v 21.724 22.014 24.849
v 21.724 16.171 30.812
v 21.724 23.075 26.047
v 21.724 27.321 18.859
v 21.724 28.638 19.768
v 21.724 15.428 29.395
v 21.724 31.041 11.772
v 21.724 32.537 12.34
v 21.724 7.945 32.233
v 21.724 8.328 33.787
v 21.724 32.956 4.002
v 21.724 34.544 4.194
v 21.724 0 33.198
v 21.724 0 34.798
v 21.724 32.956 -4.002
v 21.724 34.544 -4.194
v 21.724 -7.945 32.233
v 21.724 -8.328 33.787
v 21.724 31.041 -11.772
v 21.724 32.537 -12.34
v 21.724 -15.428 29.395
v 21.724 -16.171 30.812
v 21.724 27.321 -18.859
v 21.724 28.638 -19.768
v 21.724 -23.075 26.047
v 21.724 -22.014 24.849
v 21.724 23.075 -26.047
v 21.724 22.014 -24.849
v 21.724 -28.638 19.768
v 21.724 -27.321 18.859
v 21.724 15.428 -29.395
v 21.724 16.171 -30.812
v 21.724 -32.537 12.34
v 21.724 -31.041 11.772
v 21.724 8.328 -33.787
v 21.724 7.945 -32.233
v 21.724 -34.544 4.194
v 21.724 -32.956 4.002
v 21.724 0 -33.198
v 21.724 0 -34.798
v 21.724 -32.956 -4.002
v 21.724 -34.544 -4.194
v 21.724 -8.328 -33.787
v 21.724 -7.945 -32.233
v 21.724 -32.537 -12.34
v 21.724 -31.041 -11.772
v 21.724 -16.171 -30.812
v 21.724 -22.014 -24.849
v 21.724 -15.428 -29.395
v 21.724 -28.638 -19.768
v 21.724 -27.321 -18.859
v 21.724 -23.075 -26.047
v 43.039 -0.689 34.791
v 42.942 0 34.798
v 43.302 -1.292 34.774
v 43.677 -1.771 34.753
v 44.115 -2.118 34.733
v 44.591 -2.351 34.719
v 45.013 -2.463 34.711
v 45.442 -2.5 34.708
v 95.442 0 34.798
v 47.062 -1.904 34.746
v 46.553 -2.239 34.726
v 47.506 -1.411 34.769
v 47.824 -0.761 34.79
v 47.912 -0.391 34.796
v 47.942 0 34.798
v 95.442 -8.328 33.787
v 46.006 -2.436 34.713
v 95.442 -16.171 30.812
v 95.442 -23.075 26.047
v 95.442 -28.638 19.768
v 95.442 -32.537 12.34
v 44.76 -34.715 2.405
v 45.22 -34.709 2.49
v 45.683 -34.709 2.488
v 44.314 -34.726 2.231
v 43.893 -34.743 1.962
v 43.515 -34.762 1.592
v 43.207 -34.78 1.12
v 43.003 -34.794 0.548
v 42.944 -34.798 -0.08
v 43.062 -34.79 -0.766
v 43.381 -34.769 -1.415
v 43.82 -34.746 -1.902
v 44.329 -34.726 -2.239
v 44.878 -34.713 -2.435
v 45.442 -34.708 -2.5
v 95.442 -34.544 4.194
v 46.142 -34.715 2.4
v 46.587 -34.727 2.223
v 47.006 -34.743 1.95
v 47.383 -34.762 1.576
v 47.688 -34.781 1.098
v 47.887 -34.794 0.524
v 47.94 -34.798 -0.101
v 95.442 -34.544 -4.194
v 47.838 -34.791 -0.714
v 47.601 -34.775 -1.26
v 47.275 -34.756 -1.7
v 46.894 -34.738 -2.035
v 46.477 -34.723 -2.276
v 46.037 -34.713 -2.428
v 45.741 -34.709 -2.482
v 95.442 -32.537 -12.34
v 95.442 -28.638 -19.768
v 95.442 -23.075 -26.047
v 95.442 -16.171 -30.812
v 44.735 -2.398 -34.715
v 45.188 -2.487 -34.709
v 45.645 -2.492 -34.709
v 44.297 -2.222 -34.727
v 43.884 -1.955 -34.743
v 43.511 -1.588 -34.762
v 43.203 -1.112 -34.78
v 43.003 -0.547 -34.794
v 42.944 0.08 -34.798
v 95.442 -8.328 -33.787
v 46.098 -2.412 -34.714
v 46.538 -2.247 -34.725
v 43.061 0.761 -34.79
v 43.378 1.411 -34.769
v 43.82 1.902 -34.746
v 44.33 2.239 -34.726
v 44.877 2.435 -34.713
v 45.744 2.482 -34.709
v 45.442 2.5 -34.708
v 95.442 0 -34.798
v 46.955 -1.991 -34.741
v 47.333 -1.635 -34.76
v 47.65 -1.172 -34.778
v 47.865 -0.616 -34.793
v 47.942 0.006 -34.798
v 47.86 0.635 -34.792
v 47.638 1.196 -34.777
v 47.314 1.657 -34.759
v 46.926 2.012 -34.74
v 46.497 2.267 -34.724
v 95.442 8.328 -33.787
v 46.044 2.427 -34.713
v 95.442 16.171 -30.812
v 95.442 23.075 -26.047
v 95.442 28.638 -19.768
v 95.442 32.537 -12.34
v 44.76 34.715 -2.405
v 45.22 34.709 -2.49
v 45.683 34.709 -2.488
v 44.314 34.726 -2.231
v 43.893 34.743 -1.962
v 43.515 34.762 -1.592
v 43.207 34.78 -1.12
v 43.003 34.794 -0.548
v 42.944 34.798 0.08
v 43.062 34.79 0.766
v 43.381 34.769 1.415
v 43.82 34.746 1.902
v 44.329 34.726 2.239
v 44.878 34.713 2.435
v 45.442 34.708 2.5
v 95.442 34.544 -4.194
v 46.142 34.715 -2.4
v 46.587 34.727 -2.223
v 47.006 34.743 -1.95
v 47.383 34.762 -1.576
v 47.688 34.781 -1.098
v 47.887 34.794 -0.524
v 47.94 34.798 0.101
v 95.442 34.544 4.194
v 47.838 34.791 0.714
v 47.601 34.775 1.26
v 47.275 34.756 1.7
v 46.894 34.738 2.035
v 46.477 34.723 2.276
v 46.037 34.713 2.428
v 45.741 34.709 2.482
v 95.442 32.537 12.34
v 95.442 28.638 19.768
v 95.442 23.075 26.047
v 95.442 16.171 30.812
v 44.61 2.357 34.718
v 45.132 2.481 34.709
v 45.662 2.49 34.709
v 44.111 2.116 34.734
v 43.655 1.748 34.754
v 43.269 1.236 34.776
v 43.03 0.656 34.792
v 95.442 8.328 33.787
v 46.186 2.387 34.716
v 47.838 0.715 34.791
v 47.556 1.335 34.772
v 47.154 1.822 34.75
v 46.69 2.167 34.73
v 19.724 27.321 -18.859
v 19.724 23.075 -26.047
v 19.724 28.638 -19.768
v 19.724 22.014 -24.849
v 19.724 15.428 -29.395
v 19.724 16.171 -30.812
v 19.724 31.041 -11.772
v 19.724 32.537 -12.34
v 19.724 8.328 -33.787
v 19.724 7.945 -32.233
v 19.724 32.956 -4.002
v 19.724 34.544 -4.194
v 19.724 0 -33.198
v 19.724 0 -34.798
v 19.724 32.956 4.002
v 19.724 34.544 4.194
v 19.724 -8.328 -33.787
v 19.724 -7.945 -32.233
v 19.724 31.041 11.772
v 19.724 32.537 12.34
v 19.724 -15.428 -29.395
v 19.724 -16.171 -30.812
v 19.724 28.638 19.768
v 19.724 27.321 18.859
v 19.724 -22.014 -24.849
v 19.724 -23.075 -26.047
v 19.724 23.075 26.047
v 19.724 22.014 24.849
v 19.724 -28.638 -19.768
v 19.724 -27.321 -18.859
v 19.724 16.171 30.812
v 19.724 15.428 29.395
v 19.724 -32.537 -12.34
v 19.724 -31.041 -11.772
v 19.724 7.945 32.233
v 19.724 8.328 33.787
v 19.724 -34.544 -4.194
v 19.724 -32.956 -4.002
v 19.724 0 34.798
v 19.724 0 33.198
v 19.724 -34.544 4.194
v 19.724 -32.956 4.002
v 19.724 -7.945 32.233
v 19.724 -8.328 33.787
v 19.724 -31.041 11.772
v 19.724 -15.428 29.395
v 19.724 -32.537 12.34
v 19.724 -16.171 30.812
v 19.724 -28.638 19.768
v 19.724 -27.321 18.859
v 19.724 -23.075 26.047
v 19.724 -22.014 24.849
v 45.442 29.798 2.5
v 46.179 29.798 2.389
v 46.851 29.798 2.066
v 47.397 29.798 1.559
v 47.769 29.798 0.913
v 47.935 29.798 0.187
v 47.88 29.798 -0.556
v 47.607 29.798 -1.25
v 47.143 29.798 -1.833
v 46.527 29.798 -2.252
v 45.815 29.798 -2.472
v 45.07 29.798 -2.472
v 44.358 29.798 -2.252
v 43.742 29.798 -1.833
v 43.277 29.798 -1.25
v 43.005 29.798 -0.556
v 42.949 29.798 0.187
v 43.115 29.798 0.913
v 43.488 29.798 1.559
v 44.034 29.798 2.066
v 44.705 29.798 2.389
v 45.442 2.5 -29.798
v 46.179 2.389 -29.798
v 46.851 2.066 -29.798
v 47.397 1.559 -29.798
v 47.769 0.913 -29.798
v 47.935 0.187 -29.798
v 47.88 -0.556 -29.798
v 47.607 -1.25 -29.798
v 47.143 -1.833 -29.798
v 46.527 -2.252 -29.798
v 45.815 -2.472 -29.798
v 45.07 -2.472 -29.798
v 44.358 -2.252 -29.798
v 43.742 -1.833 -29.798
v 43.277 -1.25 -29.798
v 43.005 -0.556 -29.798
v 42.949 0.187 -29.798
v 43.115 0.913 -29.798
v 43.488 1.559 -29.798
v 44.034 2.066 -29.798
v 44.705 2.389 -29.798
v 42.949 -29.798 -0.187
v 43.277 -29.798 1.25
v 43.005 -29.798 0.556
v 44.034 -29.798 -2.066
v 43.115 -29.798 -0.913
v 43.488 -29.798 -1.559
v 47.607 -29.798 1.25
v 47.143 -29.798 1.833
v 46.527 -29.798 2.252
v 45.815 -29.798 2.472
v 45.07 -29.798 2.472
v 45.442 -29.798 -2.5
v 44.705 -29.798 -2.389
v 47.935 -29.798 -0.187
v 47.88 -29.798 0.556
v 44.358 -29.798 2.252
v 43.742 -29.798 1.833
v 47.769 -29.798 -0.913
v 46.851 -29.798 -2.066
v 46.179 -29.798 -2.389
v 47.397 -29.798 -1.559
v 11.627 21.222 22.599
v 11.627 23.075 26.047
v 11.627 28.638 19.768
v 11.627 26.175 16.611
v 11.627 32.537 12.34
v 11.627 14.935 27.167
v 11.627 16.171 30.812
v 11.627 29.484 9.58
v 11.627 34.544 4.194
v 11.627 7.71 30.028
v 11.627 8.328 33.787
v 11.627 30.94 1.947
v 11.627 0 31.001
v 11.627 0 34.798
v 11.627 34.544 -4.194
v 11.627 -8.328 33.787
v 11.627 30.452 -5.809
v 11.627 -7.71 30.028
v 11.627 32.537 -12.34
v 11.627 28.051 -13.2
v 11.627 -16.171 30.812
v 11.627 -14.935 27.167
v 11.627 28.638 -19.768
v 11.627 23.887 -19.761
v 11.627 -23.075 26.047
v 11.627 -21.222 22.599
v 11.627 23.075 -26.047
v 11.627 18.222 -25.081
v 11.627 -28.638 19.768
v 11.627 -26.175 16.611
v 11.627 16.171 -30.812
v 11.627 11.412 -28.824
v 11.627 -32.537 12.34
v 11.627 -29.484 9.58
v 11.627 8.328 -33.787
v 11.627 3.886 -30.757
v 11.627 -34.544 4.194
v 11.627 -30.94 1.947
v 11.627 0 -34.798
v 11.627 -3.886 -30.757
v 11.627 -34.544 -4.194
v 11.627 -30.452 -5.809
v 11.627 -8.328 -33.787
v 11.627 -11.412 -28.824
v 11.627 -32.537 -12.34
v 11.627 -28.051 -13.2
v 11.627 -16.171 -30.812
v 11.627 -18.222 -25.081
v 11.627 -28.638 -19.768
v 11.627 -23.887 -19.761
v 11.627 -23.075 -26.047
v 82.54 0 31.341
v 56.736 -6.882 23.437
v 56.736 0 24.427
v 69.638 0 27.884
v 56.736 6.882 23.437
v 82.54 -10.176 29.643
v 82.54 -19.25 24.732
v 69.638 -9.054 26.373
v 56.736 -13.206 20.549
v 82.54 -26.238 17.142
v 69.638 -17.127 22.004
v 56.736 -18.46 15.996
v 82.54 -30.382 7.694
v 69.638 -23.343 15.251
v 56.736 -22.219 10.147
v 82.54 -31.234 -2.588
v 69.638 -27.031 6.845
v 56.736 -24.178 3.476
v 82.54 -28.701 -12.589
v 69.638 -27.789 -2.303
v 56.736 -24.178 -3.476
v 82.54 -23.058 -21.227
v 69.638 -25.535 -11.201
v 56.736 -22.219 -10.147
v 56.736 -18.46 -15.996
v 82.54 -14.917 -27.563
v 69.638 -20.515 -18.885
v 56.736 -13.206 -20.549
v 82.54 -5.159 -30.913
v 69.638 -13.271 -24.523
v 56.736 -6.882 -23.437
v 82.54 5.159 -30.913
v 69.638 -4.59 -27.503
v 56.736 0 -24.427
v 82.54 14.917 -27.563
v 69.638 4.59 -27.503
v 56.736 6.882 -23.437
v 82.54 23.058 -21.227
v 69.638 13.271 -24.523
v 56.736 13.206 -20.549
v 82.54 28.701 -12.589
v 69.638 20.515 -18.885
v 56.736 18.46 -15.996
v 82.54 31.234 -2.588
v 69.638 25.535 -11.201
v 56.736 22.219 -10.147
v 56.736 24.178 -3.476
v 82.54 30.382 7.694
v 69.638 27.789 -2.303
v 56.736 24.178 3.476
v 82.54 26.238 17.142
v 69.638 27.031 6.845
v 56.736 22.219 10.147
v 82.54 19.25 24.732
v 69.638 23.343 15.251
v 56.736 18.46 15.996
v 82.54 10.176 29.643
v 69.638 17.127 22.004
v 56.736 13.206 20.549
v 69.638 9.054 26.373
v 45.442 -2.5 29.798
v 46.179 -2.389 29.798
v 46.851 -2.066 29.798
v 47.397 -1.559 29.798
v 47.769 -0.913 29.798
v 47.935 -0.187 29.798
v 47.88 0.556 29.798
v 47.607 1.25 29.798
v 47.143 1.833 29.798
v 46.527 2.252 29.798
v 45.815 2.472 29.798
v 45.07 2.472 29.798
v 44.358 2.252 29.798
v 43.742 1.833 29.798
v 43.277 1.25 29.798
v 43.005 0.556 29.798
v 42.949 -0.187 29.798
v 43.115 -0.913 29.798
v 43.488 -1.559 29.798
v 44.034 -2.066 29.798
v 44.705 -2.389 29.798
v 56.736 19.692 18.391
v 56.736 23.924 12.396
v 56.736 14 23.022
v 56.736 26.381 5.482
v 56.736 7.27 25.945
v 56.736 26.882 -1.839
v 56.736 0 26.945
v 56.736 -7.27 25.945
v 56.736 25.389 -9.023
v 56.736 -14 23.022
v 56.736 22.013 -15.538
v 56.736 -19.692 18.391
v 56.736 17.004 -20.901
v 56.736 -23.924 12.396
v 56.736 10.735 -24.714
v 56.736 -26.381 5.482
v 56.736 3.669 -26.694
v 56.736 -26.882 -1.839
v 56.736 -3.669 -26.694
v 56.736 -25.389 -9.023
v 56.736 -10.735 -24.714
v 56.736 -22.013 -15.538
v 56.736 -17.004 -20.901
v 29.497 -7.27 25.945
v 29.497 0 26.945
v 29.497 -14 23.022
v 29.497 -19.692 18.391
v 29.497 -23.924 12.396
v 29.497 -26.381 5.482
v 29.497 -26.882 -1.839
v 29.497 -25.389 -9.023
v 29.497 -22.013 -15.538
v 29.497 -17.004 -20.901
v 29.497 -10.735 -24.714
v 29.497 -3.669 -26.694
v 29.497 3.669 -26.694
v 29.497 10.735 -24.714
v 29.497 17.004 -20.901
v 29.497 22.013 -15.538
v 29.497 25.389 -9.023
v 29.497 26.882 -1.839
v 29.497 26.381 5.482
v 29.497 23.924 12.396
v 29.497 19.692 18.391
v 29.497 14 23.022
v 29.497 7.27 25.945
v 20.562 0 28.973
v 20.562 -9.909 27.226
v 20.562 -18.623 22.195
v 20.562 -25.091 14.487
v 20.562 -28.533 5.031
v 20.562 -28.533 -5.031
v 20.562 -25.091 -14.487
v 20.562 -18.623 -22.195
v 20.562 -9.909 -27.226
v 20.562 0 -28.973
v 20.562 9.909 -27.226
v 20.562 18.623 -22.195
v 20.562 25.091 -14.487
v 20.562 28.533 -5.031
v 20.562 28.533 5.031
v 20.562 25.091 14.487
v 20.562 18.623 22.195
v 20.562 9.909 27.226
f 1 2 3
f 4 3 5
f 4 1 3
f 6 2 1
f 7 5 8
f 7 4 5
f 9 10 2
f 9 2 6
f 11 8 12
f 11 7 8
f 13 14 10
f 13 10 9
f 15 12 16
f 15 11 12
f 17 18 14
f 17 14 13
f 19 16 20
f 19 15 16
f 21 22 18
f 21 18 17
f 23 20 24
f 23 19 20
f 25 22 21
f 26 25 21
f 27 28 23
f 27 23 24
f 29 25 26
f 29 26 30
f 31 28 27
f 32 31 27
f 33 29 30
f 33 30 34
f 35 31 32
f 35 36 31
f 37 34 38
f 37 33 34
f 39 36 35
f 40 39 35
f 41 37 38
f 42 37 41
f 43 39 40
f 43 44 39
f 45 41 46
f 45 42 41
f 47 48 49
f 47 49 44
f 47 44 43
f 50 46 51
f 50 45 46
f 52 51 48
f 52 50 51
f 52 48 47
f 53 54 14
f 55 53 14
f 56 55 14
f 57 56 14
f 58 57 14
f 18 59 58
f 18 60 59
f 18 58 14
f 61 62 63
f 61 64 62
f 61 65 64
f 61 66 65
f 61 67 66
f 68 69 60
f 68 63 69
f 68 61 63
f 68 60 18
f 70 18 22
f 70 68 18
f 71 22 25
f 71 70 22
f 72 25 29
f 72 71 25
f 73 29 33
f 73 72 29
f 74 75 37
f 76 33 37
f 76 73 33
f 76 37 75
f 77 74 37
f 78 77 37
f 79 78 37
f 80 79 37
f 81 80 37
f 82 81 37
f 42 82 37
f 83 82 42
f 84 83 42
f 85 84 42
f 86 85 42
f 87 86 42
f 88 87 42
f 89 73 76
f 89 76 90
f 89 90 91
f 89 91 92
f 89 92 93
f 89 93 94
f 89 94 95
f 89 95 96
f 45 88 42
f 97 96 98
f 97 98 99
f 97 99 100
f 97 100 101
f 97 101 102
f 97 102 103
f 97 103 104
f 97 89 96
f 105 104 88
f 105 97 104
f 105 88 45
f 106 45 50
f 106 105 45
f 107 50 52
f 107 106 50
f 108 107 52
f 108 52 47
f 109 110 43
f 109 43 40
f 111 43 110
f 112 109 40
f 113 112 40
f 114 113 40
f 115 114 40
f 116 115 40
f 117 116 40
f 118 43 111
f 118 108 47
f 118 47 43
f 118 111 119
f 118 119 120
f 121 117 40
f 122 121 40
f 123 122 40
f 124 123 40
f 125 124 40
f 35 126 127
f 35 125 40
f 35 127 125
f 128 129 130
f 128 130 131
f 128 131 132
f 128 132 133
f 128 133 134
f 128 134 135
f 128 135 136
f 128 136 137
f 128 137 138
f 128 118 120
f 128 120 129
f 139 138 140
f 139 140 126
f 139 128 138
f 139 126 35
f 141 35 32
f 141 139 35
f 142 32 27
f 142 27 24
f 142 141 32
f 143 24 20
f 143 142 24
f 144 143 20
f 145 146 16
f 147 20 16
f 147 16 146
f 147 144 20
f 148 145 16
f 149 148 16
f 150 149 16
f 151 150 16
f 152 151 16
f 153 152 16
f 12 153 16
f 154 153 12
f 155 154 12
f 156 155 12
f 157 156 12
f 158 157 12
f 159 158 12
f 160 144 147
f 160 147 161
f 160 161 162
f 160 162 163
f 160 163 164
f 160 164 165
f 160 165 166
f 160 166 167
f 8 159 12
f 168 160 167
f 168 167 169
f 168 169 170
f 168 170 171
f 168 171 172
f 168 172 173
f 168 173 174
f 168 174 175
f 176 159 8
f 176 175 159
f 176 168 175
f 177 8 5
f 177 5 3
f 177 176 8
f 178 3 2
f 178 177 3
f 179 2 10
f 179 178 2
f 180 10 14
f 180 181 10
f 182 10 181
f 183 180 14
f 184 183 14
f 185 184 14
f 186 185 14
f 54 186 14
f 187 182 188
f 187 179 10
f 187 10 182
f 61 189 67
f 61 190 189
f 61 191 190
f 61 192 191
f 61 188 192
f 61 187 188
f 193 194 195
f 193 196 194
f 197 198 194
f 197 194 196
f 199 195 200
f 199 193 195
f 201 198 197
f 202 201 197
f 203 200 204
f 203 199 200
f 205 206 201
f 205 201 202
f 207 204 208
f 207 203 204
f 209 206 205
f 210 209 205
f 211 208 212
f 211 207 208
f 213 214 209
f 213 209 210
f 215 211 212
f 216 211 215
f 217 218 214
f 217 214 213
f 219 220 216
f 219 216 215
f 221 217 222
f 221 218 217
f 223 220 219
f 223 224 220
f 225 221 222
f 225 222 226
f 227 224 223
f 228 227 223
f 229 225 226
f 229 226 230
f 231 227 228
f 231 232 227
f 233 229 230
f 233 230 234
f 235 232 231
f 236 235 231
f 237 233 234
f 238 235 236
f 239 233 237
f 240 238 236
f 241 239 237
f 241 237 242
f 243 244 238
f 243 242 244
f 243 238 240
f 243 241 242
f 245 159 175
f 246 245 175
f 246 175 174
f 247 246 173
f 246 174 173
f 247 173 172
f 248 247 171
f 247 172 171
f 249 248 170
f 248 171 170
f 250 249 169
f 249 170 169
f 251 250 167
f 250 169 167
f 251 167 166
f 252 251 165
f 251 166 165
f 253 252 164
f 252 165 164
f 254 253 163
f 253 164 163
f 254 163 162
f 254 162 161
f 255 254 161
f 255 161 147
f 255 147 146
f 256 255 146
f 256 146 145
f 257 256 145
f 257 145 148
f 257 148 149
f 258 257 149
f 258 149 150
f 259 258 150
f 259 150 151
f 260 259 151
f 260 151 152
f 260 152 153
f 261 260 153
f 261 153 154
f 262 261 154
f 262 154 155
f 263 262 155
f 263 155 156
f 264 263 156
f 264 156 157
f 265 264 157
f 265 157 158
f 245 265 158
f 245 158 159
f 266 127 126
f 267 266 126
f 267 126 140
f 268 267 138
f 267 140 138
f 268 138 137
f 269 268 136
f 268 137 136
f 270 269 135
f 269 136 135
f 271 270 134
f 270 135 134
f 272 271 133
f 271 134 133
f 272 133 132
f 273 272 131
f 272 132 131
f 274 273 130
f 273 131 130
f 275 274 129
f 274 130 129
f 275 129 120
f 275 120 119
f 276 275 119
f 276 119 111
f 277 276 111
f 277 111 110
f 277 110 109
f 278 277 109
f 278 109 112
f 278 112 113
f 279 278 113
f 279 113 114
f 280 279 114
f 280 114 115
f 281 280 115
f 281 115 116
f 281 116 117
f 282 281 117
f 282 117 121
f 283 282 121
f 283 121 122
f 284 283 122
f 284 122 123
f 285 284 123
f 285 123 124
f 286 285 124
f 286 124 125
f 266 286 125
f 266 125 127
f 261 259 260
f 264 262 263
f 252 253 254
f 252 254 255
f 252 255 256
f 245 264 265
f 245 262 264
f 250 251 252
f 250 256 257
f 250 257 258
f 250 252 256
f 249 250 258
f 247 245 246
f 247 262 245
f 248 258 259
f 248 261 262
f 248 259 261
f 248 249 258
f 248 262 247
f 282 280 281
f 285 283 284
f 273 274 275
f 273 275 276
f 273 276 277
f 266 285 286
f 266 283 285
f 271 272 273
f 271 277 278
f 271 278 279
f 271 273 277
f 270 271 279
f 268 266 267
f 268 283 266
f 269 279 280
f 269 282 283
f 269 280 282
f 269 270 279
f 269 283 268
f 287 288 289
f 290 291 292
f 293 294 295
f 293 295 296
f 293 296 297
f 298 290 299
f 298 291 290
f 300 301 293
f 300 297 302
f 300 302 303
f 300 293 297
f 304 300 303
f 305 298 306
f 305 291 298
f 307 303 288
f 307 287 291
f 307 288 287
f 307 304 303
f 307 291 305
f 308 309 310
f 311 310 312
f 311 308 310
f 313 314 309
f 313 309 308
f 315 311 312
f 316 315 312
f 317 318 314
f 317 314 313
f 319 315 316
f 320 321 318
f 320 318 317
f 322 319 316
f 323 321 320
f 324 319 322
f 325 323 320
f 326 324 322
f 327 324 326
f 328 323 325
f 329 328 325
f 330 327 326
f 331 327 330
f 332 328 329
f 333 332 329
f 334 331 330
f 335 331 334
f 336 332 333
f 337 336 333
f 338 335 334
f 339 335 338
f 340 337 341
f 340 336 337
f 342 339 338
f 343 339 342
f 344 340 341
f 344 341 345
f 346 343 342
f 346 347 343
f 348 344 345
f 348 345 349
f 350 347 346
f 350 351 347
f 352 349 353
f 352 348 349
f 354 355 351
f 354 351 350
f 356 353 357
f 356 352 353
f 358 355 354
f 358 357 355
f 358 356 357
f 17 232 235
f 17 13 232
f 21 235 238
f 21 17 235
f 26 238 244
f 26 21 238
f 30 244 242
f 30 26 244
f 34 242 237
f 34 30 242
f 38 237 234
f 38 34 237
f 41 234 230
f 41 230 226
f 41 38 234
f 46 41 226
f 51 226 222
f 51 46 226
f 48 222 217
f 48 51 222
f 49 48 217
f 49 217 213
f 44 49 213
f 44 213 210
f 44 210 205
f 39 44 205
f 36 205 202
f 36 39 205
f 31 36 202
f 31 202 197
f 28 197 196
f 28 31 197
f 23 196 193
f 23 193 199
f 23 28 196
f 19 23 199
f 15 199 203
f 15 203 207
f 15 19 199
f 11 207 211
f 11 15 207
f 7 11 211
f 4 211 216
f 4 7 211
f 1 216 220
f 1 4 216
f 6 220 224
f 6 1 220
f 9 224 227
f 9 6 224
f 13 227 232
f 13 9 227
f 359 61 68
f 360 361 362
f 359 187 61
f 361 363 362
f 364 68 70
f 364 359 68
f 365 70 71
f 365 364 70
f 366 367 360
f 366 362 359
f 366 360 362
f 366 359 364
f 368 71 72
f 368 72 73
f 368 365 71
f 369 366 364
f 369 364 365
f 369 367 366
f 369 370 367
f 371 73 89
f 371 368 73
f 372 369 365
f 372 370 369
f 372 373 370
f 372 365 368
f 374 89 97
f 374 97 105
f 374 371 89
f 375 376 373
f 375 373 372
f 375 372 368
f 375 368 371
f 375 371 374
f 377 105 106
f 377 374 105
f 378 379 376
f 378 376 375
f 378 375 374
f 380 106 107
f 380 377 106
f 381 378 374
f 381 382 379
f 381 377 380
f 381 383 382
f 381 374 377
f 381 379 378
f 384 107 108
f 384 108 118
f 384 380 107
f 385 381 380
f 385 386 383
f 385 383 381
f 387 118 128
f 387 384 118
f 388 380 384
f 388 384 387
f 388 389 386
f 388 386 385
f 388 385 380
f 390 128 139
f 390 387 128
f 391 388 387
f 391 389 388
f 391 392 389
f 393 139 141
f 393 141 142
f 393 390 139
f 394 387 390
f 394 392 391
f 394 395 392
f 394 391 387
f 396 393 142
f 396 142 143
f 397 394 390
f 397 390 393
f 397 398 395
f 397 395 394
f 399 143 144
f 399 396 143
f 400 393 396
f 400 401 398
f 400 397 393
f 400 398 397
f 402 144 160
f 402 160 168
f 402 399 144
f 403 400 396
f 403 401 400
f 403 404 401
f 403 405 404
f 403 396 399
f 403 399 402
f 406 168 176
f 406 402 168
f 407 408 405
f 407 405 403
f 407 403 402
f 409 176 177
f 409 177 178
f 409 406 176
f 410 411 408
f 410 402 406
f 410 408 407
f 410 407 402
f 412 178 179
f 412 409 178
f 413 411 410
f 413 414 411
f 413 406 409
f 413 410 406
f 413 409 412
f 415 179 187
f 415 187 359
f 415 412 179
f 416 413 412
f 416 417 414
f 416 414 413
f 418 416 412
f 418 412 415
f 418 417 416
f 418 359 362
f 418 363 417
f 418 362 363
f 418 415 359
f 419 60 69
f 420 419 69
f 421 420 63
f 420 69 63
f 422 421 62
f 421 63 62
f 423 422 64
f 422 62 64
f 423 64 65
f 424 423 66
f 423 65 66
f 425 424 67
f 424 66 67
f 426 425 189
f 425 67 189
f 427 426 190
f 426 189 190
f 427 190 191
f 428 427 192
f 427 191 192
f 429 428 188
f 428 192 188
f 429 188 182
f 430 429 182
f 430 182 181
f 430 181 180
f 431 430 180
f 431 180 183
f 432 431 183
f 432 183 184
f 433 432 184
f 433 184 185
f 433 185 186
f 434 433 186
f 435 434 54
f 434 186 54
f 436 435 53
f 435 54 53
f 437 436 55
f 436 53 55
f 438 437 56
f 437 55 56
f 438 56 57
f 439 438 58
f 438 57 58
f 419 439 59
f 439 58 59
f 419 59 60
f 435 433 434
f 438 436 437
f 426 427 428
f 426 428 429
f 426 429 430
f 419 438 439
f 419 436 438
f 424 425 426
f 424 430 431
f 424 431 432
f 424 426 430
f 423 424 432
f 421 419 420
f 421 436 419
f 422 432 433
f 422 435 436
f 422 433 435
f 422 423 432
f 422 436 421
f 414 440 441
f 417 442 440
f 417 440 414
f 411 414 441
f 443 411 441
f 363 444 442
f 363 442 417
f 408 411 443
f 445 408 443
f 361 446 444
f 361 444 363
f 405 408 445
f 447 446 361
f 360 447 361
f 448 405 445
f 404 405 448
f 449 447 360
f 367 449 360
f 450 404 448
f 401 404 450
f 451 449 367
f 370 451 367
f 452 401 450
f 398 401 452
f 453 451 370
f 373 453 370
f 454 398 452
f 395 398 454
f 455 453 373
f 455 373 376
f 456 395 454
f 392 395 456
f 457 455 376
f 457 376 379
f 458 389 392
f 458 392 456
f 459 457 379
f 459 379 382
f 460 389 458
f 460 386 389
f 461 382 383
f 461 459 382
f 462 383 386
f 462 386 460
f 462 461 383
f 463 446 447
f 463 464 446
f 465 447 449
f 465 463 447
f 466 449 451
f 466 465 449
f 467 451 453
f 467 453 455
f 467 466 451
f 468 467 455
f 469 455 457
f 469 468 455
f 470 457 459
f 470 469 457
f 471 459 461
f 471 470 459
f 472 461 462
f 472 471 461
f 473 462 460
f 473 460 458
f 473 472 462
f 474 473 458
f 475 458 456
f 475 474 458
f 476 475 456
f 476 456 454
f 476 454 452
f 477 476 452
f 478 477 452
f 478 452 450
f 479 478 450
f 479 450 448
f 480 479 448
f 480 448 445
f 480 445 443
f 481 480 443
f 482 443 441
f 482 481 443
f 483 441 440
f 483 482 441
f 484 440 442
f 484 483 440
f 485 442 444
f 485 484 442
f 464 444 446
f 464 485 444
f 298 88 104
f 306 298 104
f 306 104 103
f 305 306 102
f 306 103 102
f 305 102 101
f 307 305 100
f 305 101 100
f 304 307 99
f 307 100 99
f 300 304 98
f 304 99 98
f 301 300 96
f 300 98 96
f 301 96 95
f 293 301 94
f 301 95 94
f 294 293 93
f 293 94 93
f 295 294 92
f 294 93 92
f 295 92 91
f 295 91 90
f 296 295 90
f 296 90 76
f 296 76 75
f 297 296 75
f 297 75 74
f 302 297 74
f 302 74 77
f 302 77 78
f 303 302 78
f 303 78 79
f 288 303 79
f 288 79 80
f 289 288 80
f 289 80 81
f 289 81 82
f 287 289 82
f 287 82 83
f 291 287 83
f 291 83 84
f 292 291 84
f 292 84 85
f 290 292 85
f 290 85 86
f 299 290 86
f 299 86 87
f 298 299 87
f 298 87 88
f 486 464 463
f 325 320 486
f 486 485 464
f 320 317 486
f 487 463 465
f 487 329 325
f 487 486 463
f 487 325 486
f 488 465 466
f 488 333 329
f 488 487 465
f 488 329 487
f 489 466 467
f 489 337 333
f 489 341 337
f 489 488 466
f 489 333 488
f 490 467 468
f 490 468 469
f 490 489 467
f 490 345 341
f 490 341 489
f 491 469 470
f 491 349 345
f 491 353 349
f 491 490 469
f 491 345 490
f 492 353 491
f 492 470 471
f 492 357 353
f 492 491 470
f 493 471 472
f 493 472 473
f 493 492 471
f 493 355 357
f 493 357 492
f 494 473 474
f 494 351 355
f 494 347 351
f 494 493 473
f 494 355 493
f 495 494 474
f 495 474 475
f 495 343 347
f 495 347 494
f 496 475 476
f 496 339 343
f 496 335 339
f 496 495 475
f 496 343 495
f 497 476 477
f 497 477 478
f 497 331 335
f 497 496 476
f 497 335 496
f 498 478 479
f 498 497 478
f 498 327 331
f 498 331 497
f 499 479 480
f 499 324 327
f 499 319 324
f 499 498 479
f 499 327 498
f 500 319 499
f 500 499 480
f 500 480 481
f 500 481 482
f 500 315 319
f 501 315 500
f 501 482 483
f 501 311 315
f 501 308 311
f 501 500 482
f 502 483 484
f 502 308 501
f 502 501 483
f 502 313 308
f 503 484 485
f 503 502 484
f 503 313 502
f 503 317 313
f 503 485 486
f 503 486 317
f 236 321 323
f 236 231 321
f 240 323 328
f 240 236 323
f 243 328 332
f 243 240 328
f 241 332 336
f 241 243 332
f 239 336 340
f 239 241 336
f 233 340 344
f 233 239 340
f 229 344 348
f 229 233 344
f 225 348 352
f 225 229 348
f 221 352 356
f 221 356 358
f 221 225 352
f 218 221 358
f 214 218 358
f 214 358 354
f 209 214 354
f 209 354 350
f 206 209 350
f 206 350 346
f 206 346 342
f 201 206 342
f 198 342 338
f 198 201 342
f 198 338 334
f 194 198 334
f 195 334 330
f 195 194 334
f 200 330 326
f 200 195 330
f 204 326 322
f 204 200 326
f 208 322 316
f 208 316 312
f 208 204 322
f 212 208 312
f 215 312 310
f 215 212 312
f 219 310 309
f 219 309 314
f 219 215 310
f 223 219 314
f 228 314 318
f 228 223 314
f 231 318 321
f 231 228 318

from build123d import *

# Parameters (mm, degrees)
SKETCH2_R          = 2.5
CUT_EXTRUDE1_DEPTH = 5
CIRPATTERN1_COUNT  = 4


with BuildPart() as part:
    # Sketch1 → Revolve1 (revolve)
    with BuildSketch(Plane.XY, mode=Mode.PRIVATE) as revolve1_sk:
        Polygon((11.626929507, 34.798), (19.723685425, 34.798), (19.723685425, 33.198), (21.723685425, 33.198), (21.723685425, 34.798), (95.442270017, 34.798), (56.73579947, 24.426632475), (56.73579947, 26.944570435), (29.496610327, 26.944570435), (11.626929507, 31.001470945), align=None)
    revolve(revolve1_sk.sketch.rotate(Axis((0, 0, 0), (1, 0, 0)), 90), axis=Axis((0, 0, 0), (1, 0, 0)))

    # Sketch2 → Cut-Extrude1 (cut)
    with BuildSketch(Plane(origin=(0, 34.798, 0), x_dir=(1, 0, 0), z_dir=(0, 1, 0))):
        with Locations(Location((45.442270017, 0, 0), (0, 0, 270))):
            Circle(SKETCH2_R)
    cut_extrude1 = extrude(amount=-CUT_EXTRUDE1_DEPTH, mode=Mode.SUBTRACT)

    # CirPattern1: Cut-Extrude1 ×4 about axis
    cirpattern1_axis = Axis((0, 0, 0), (1, 0, 0))
    for i in range(1, CIRPATTERN1_COUNT):
        add(cut_extrude1.rotate(cirpattern1_axis, i * 360 / CIRPATTERN1_COUNT), mode=Mode.SUBTRACT)


solid = part.part
